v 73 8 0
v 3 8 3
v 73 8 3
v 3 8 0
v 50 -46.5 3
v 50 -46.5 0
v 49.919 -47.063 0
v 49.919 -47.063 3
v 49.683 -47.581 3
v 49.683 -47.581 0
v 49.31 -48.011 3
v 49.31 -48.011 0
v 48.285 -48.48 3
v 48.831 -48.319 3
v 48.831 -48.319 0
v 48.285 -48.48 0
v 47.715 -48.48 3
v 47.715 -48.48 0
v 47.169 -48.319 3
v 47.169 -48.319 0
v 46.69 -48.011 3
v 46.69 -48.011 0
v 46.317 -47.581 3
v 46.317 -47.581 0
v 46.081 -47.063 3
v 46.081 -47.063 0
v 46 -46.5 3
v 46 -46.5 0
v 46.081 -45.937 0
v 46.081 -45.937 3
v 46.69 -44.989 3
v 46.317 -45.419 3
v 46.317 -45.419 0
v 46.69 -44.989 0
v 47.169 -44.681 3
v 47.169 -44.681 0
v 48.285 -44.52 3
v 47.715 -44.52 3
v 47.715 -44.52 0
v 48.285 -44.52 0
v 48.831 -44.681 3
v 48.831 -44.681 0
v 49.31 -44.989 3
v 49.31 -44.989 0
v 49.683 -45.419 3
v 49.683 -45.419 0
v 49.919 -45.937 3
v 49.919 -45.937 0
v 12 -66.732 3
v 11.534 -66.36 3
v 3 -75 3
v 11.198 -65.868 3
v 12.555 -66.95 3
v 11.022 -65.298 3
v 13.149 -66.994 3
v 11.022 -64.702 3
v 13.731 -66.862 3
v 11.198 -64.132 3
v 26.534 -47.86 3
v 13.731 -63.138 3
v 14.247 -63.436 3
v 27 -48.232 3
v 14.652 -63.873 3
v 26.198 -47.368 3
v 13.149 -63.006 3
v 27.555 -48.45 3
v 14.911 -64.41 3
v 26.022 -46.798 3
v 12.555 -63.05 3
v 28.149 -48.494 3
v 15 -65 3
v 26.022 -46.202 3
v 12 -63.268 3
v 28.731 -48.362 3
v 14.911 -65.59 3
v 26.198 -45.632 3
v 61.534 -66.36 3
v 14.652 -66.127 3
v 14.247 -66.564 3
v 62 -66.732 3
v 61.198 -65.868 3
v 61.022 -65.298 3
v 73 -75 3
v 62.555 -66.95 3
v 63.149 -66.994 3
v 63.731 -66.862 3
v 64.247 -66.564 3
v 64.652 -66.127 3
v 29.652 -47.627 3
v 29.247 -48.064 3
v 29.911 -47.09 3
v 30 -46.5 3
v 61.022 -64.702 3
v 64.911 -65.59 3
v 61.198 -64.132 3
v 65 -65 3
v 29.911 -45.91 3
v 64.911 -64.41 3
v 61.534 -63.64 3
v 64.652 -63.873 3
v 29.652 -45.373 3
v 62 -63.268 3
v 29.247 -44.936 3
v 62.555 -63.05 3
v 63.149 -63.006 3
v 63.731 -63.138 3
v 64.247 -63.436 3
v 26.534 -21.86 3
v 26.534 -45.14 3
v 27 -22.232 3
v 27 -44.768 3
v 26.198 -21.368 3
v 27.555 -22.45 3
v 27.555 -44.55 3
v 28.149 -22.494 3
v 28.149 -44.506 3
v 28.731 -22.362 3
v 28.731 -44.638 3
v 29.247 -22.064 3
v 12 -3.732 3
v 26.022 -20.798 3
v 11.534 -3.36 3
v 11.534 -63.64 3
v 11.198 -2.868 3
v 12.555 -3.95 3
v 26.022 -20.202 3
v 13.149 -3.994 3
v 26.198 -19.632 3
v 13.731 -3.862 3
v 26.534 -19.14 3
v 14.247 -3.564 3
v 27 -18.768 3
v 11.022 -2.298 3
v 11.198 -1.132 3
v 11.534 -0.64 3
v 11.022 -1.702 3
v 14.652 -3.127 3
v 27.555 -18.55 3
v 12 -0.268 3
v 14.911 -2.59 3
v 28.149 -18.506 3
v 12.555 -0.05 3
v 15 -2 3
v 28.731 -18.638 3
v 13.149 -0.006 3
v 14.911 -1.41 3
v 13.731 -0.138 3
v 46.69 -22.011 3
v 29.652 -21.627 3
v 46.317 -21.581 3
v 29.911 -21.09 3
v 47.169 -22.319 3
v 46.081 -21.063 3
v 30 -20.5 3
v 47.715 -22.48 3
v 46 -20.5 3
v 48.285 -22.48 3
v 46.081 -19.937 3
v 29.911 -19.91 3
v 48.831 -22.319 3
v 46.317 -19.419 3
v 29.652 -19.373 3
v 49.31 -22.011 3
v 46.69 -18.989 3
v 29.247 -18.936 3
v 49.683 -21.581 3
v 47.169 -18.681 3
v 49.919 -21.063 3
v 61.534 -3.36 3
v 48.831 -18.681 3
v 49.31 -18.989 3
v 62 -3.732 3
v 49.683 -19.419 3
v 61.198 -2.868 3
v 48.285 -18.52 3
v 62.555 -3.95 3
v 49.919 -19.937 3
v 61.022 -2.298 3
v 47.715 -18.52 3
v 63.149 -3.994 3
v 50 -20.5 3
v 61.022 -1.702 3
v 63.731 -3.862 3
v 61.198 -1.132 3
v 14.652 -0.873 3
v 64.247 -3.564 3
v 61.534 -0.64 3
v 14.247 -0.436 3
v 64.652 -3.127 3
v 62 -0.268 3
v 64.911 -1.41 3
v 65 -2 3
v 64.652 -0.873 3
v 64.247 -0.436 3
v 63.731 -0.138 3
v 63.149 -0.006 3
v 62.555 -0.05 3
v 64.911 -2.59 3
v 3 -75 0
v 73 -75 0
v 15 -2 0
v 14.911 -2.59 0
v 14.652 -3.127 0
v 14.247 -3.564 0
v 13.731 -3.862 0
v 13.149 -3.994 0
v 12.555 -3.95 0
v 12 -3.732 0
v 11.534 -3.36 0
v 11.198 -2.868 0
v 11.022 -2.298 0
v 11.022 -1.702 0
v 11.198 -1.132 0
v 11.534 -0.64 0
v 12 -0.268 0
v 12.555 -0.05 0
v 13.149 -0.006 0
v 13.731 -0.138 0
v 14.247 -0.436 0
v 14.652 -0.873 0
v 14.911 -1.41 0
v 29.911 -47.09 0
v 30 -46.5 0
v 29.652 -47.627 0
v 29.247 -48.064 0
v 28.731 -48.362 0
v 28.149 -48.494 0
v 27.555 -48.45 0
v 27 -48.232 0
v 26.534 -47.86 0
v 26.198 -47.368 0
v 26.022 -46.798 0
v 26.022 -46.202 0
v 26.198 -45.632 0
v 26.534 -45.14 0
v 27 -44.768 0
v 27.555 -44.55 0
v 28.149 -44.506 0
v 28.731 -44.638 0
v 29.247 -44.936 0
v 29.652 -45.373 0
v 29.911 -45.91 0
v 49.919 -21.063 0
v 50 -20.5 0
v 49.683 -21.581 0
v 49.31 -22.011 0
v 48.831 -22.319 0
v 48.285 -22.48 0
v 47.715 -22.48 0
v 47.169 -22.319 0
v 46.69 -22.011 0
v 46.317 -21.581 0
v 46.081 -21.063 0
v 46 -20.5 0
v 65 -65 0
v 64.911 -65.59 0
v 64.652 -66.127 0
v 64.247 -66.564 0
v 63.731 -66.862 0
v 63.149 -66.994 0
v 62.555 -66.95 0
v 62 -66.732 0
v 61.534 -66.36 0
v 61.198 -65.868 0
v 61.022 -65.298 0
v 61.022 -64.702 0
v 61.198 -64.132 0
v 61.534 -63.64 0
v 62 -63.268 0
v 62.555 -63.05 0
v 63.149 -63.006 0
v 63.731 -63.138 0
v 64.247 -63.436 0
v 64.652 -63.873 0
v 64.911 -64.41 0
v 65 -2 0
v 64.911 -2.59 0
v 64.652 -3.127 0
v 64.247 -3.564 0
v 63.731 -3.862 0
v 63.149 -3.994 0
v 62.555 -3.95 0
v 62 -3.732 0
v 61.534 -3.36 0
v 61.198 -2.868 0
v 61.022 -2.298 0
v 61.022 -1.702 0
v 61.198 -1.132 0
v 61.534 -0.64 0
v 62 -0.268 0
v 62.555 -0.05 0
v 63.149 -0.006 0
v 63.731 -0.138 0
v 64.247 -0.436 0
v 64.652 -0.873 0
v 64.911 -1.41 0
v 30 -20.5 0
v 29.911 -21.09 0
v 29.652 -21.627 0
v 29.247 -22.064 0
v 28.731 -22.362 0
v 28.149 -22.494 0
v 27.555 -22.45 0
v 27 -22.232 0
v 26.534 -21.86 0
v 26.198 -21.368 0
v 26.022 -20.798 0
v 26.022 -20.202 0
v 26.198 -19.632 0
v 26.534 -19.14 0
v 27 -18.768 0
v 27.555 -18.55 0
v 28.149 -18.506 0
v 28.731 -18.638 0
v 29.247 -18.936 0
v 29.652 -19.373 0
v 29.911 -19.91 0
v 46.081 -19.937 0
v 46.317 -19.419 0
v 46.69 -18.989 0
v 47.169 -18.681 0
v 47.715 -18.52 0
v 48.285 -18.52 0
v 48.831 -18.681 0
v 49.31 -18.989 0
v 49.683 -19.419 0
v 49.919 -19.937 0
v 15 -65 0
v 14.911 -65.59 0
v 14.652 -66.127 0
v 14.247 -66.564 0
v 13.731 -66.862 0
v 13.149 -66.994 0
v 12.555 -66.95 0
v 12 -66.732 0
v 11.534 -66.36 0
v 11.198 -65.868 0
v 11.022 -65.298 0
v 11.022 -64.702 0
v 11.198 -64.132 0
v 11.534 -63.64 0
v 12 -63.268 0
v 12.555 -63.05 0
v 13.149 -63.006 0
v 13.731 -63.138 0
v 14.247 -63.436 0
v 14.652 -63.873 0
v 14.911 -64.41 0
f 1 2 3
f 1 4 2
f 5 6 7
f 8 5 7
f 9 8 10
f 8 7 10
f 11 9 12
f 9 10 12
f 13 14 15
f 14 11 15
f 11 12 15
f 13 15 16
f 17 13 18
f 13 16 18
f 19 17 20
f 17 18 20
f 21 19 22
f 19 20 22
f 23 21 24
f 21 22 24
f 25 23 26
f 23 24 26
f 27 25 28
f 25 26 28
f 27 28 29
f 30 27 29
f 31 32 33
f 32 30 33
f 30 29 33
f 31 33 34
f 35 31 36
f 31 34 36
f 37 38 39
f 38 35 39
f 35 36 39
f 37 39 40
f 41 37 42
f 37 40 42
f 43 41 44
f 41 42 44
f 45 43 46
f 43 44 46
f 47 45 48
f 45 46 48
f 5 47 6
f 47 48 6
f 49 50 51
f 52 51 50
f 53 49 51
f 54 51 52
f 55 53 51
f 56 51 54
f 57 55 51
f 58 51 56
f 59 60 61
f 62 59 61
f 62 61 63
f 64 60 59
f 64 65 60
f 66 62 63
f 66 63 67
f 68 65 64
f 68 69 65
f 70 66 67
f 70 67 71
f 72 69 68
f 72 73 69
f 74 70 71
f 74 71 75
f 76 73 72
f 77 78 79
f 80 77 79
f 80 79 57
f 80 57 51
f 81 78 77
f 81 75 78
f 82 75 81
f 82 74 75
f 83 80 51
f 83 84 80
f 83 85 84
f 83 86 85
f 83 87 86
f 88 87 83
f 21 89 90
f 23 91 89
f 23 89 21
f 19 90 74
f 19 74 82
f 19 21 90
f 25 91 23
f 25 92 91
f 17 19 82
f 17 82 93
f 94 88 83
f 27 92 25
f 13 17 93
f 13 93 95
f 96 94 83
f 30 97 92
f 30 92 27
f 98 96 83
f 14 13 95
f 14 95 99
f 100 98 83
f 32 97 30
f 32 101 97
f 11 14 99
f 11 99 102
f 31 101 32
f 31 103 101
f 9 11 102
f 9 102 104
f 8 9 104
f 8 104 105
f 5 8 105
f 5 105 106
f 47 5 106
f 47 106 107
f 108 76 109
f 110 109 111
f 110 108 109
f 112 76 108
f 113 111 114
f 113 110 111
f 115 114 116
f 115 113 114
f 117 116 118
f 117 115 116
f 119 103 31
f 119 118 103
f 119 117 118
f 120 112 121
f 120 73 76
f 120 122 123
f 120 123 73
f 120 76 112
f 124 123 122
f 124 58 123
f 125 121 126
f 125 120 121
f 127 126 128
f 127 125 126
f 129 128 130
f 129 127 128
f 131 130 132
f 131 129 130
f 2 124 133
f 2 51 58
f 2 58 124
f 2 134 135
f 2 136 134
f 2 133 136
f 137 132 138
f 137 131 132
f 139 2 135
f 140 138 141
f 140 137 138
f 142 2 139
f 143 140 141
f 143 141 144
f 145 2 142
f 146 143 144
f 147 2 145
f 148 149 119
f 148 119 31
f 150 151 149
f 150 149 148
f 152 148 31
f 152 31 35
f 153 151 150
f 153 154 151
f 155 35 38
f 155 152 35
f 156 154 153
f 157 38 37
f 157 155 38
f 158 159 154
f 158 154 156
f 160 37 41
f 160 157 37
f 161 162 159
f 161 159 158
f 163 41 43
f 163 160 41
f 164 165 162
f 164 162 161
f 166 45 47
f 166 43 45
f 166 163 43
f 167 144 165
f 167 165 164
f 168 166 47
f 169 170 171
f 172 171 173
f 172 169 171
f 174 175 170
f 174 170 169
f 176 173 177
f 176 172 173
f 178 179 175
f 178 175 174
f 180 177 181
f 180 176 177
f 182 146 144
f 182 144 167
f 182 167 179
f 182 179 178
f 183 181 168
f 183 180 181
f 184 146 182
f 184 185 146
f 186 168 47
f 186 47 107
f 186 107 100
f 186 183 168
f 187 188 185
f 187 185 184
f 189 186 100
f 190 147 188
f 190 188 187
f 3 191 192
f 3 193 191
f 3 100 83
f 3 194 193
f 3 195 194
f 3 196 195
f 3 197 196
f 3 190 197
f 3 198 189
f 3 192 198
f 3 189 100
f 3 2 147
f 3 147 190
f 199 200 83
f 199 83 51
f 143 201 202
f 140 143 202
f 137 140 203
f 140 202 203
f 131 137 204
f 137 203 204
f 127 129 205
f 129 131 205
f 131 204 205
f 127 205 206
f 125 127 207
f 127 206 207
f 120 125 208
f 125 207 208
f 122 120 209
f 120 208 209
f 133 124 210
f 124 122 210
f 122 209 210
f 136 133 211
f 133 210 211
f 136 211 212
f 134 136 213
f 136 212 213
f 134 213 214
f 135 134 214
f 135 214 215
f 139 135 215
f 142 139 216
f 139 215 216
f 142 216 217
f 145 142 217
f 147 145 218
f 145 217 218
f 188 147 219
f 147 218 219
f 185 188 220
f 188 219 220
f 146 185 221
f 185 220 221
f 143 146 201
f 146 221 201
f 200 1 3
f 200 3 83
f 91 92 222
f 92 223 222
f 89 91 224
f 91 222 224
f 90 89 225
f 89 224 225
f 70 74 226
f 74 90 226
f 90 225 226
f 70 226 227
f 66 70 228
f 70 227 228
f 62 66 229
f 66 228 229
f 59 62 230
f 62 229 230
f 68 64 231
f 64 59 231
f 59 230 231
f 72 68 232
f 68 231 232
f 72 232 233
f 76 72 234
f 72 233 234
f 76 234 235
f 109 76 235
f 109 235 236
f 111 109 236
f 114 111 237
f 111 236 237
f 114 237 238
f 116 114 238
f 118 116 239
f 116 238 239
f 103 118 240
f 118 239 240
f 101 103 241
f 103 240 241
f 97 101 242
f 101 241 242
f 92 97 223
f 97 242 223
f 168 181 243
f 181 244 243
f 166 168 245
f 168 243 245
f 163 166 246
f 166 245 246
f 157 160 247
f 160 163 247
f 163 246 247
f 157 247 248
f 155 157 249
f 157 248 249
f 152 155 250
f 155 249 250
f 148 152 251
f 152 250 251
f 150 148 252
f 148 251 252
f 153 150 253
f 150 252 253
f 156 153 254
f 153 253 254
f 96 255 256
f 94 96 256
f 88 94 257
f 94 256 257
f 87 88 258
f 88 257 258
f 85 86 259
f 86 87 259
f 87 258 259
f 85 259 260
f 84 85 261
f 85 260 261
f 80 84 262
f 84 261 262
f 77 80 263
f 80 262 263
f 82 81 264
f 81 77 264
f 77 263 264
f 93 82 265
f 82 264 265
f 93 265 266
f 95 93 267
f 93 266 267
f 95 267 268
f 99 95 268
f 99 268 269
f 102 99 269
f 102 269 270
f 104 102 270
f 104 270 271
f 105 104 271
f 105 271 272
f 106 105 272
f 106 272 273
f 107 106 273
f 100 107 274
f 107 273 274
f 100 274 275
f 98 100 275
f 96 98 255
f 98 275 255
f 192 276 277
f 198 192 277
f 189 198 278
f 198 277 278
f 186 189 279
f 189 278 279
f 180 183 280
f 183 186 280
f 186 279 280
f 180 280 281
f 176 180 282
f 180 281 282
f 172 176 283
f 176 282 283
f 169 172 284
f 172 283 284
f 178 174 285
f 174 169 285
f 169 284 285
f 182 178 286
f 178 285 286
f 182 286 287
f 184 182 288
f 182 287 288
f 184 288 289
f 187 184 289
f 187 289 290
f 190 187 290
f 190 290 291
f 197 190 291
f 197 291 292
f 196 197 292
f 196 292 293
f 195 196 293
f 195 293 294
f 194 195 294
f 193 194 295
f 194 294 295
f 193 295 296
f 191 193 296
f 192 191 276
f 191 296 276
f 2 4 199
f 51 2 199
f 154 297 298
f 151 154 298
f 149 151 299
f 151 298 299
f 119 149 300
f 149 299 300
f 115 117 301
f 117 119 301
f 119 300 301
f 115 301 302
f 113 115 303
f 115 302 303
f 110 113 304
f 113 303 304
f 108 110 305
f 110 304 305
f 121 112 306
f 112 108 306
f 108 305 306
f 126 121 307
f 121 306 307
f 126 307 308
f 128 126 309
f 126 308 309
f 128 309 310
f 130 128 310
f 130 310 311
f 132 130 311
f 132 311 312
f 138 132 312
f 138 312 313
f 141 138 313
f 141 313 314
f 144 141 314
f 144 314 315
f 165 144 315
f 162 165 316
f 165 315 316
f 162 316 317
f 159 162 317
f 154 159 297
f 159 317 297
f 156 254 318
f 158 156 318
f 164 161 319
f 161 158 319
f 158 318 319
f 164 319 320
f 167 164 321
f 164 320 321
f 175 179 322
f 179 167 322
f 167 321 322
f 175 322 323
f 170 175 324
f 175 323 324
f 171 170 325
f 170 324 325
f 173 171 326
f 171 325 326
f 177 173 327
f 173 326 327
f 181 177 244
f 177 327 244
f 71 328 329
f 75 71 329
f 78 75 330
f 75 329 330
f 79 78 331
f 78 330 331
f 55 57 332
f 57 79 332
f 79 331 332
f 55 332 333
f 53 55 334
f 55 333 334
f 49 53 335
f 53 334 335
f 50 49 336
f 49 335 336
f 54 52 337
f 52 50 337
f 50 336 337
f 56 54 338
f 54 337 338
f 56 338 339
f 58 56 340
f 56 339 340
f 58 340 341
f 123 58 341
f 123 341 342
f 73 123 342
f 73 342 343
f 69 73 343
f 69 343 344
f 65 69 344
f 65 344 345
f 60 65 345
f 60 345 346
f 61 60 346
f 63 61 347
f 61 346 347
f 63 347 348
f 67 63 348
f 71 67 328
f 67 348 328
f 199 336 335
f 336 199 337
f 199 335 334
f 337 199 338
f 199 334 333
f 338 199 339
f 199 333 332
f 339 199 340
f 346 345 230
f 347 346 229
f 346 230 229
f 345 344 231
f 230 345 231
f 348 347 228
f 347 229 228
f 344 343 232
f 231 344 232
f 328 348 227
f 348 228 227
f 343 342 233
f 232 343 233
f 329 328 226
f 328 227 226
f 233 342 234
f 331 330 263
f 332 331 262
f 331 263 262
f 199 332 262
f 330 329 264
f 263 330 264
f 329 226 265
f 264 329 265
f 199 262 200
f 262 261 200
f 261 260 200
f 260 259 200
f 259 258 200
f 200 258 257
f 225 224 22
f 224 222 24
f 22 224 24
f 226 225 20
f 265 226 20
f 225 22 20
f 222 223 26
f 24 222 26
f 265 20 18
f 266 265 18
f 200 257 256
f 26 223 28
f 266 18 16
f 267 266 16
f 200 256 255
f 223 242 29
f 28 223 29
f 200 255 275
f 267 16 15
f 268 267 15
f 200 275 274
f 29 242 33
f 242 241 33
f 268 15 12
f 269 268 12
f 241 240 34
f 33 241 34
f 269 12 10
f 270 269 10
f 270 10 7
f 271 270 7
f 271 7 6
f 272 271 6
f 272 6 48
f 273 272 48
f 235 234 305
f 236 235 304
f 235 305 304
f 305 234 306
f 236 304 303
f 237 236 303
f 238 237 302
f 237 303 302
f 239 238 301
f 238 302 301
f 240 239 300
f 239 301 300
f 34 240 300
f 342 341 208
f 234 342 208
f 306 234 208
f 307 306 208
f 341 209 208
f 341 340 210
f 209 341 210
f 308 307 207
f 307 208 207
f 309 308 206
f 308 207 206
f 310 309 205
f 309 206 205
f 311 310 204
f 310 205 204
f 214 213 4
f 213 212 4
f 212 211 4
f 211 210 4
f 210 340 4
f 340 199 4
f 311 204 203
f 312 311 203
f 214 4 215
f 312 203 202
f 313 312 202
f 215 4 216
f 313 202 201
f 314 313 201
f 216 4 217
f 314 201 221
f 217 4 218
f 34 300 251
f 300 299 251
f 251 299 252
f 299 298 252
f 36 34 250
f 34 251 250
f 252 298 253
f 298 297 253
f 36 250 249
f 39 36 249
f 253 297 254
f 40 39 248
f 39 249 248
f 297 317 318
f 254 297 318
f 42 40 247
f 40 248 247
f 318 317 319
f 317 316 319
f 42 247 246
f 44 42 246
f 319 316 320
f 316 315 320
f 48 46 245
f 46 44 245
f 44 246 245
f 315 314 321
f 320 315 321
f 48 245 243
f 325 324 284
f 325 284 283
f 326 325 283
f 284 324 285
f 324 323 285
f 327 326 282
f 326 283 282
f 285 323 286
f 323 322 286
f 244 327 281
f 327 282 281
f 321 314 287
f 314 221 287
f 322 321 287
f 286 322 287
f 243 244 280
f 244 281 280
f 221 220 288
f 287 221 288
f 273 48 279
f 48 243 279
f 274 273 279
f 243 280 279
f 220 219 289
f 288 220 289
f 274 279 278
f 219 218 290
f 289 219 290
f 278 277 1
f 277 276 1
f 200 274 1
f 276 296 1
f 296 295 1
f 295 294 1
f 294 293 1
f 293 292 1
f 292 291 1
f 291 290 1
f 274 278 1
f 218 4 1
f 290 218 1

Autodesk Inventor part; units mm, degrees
ref_plane "YZ Plane" through (0, 0, 0) normal (1, 0, 0) x (0, 1, 0)
ref_plane "XZ Plane" through (0, 0, 0) normal (0, 1, 0) x (-1, 0, 0)
ref_plane "XY Plane" through (0, 0, 0) normal (0, 0, 1) x (1, 0, 0)
sketch "Sketch1" plane through (0, 0, 0) normal (0, 0, 1) x (1, 0, 0)
  line L0 (73, -75) -> (3, -75)
  line L1 (3, 8) -> (3, -75)
  line L2 (3, 8) -> (73, 8)
  line L3 (73, 8) -> (73, -75)
  circle A0 centre (13, -65) radius 2
  circle A1 centre (13, -2) radius 2
  circle A2 centre (63, -65) radius 2
  circle A3 centre (63, -2) radius 2
  circle A4 centre (28, -46.5) radius 2
  circle A5 centre (48, -46.5) radius 2
  line L4 (28, -46.5) -> (48, -46.5)
  circle A6 centre (28, -20.5) radius 2
  circle A7 centre (48, -20.5) radius 2
  line L5 (28, -20.5) -> (48, -20.5)
  point P0 (0, 0)
  dimension "d0" = 70
  dimension "d1" = 83
  dimension "d4" = 4
  dimension "d5" = 10
  dimension "d6" = 10
  dimension "d7" = 4
  dimension "d8" = 4
  dimension "d9" = 4
  dimension "d10" = 10
  dimension "d11" = 10
  dimension "d12" = 10
  dimension "d13" = 10
  dimension "d14" = 10
  dimension "d15" = 10
  dimension "d16" = 4
  dimension "d17" = 20
  dimension "d18" = 4
  dimension "d19" = 4
  dimension "d20" = 20
  dimension "d21" = 4
  dimension "d22" = 26
  dimension "d23" = 28.5
  dimension "d24" = 25
extrude "Extrusion1" add sketch "Sketch1" along normal blind 3
equation "\"d10\" = d5"
equation "\"d11\" = d6"
equation "\"d13\" = d12"
equation "\"d14\" = d13"
equation "\"d15\" = d14"
equation "\"d18\" = d16"
equation "\"d21\" = d19"
equation "\"d23\" = -0.5 * d22 + 0.5 * d1"
equation "\"d24\" = -0.5 * d17 + 0.5 * d0"
properties part number "BaseC_8" material "PMMA Plastic"
